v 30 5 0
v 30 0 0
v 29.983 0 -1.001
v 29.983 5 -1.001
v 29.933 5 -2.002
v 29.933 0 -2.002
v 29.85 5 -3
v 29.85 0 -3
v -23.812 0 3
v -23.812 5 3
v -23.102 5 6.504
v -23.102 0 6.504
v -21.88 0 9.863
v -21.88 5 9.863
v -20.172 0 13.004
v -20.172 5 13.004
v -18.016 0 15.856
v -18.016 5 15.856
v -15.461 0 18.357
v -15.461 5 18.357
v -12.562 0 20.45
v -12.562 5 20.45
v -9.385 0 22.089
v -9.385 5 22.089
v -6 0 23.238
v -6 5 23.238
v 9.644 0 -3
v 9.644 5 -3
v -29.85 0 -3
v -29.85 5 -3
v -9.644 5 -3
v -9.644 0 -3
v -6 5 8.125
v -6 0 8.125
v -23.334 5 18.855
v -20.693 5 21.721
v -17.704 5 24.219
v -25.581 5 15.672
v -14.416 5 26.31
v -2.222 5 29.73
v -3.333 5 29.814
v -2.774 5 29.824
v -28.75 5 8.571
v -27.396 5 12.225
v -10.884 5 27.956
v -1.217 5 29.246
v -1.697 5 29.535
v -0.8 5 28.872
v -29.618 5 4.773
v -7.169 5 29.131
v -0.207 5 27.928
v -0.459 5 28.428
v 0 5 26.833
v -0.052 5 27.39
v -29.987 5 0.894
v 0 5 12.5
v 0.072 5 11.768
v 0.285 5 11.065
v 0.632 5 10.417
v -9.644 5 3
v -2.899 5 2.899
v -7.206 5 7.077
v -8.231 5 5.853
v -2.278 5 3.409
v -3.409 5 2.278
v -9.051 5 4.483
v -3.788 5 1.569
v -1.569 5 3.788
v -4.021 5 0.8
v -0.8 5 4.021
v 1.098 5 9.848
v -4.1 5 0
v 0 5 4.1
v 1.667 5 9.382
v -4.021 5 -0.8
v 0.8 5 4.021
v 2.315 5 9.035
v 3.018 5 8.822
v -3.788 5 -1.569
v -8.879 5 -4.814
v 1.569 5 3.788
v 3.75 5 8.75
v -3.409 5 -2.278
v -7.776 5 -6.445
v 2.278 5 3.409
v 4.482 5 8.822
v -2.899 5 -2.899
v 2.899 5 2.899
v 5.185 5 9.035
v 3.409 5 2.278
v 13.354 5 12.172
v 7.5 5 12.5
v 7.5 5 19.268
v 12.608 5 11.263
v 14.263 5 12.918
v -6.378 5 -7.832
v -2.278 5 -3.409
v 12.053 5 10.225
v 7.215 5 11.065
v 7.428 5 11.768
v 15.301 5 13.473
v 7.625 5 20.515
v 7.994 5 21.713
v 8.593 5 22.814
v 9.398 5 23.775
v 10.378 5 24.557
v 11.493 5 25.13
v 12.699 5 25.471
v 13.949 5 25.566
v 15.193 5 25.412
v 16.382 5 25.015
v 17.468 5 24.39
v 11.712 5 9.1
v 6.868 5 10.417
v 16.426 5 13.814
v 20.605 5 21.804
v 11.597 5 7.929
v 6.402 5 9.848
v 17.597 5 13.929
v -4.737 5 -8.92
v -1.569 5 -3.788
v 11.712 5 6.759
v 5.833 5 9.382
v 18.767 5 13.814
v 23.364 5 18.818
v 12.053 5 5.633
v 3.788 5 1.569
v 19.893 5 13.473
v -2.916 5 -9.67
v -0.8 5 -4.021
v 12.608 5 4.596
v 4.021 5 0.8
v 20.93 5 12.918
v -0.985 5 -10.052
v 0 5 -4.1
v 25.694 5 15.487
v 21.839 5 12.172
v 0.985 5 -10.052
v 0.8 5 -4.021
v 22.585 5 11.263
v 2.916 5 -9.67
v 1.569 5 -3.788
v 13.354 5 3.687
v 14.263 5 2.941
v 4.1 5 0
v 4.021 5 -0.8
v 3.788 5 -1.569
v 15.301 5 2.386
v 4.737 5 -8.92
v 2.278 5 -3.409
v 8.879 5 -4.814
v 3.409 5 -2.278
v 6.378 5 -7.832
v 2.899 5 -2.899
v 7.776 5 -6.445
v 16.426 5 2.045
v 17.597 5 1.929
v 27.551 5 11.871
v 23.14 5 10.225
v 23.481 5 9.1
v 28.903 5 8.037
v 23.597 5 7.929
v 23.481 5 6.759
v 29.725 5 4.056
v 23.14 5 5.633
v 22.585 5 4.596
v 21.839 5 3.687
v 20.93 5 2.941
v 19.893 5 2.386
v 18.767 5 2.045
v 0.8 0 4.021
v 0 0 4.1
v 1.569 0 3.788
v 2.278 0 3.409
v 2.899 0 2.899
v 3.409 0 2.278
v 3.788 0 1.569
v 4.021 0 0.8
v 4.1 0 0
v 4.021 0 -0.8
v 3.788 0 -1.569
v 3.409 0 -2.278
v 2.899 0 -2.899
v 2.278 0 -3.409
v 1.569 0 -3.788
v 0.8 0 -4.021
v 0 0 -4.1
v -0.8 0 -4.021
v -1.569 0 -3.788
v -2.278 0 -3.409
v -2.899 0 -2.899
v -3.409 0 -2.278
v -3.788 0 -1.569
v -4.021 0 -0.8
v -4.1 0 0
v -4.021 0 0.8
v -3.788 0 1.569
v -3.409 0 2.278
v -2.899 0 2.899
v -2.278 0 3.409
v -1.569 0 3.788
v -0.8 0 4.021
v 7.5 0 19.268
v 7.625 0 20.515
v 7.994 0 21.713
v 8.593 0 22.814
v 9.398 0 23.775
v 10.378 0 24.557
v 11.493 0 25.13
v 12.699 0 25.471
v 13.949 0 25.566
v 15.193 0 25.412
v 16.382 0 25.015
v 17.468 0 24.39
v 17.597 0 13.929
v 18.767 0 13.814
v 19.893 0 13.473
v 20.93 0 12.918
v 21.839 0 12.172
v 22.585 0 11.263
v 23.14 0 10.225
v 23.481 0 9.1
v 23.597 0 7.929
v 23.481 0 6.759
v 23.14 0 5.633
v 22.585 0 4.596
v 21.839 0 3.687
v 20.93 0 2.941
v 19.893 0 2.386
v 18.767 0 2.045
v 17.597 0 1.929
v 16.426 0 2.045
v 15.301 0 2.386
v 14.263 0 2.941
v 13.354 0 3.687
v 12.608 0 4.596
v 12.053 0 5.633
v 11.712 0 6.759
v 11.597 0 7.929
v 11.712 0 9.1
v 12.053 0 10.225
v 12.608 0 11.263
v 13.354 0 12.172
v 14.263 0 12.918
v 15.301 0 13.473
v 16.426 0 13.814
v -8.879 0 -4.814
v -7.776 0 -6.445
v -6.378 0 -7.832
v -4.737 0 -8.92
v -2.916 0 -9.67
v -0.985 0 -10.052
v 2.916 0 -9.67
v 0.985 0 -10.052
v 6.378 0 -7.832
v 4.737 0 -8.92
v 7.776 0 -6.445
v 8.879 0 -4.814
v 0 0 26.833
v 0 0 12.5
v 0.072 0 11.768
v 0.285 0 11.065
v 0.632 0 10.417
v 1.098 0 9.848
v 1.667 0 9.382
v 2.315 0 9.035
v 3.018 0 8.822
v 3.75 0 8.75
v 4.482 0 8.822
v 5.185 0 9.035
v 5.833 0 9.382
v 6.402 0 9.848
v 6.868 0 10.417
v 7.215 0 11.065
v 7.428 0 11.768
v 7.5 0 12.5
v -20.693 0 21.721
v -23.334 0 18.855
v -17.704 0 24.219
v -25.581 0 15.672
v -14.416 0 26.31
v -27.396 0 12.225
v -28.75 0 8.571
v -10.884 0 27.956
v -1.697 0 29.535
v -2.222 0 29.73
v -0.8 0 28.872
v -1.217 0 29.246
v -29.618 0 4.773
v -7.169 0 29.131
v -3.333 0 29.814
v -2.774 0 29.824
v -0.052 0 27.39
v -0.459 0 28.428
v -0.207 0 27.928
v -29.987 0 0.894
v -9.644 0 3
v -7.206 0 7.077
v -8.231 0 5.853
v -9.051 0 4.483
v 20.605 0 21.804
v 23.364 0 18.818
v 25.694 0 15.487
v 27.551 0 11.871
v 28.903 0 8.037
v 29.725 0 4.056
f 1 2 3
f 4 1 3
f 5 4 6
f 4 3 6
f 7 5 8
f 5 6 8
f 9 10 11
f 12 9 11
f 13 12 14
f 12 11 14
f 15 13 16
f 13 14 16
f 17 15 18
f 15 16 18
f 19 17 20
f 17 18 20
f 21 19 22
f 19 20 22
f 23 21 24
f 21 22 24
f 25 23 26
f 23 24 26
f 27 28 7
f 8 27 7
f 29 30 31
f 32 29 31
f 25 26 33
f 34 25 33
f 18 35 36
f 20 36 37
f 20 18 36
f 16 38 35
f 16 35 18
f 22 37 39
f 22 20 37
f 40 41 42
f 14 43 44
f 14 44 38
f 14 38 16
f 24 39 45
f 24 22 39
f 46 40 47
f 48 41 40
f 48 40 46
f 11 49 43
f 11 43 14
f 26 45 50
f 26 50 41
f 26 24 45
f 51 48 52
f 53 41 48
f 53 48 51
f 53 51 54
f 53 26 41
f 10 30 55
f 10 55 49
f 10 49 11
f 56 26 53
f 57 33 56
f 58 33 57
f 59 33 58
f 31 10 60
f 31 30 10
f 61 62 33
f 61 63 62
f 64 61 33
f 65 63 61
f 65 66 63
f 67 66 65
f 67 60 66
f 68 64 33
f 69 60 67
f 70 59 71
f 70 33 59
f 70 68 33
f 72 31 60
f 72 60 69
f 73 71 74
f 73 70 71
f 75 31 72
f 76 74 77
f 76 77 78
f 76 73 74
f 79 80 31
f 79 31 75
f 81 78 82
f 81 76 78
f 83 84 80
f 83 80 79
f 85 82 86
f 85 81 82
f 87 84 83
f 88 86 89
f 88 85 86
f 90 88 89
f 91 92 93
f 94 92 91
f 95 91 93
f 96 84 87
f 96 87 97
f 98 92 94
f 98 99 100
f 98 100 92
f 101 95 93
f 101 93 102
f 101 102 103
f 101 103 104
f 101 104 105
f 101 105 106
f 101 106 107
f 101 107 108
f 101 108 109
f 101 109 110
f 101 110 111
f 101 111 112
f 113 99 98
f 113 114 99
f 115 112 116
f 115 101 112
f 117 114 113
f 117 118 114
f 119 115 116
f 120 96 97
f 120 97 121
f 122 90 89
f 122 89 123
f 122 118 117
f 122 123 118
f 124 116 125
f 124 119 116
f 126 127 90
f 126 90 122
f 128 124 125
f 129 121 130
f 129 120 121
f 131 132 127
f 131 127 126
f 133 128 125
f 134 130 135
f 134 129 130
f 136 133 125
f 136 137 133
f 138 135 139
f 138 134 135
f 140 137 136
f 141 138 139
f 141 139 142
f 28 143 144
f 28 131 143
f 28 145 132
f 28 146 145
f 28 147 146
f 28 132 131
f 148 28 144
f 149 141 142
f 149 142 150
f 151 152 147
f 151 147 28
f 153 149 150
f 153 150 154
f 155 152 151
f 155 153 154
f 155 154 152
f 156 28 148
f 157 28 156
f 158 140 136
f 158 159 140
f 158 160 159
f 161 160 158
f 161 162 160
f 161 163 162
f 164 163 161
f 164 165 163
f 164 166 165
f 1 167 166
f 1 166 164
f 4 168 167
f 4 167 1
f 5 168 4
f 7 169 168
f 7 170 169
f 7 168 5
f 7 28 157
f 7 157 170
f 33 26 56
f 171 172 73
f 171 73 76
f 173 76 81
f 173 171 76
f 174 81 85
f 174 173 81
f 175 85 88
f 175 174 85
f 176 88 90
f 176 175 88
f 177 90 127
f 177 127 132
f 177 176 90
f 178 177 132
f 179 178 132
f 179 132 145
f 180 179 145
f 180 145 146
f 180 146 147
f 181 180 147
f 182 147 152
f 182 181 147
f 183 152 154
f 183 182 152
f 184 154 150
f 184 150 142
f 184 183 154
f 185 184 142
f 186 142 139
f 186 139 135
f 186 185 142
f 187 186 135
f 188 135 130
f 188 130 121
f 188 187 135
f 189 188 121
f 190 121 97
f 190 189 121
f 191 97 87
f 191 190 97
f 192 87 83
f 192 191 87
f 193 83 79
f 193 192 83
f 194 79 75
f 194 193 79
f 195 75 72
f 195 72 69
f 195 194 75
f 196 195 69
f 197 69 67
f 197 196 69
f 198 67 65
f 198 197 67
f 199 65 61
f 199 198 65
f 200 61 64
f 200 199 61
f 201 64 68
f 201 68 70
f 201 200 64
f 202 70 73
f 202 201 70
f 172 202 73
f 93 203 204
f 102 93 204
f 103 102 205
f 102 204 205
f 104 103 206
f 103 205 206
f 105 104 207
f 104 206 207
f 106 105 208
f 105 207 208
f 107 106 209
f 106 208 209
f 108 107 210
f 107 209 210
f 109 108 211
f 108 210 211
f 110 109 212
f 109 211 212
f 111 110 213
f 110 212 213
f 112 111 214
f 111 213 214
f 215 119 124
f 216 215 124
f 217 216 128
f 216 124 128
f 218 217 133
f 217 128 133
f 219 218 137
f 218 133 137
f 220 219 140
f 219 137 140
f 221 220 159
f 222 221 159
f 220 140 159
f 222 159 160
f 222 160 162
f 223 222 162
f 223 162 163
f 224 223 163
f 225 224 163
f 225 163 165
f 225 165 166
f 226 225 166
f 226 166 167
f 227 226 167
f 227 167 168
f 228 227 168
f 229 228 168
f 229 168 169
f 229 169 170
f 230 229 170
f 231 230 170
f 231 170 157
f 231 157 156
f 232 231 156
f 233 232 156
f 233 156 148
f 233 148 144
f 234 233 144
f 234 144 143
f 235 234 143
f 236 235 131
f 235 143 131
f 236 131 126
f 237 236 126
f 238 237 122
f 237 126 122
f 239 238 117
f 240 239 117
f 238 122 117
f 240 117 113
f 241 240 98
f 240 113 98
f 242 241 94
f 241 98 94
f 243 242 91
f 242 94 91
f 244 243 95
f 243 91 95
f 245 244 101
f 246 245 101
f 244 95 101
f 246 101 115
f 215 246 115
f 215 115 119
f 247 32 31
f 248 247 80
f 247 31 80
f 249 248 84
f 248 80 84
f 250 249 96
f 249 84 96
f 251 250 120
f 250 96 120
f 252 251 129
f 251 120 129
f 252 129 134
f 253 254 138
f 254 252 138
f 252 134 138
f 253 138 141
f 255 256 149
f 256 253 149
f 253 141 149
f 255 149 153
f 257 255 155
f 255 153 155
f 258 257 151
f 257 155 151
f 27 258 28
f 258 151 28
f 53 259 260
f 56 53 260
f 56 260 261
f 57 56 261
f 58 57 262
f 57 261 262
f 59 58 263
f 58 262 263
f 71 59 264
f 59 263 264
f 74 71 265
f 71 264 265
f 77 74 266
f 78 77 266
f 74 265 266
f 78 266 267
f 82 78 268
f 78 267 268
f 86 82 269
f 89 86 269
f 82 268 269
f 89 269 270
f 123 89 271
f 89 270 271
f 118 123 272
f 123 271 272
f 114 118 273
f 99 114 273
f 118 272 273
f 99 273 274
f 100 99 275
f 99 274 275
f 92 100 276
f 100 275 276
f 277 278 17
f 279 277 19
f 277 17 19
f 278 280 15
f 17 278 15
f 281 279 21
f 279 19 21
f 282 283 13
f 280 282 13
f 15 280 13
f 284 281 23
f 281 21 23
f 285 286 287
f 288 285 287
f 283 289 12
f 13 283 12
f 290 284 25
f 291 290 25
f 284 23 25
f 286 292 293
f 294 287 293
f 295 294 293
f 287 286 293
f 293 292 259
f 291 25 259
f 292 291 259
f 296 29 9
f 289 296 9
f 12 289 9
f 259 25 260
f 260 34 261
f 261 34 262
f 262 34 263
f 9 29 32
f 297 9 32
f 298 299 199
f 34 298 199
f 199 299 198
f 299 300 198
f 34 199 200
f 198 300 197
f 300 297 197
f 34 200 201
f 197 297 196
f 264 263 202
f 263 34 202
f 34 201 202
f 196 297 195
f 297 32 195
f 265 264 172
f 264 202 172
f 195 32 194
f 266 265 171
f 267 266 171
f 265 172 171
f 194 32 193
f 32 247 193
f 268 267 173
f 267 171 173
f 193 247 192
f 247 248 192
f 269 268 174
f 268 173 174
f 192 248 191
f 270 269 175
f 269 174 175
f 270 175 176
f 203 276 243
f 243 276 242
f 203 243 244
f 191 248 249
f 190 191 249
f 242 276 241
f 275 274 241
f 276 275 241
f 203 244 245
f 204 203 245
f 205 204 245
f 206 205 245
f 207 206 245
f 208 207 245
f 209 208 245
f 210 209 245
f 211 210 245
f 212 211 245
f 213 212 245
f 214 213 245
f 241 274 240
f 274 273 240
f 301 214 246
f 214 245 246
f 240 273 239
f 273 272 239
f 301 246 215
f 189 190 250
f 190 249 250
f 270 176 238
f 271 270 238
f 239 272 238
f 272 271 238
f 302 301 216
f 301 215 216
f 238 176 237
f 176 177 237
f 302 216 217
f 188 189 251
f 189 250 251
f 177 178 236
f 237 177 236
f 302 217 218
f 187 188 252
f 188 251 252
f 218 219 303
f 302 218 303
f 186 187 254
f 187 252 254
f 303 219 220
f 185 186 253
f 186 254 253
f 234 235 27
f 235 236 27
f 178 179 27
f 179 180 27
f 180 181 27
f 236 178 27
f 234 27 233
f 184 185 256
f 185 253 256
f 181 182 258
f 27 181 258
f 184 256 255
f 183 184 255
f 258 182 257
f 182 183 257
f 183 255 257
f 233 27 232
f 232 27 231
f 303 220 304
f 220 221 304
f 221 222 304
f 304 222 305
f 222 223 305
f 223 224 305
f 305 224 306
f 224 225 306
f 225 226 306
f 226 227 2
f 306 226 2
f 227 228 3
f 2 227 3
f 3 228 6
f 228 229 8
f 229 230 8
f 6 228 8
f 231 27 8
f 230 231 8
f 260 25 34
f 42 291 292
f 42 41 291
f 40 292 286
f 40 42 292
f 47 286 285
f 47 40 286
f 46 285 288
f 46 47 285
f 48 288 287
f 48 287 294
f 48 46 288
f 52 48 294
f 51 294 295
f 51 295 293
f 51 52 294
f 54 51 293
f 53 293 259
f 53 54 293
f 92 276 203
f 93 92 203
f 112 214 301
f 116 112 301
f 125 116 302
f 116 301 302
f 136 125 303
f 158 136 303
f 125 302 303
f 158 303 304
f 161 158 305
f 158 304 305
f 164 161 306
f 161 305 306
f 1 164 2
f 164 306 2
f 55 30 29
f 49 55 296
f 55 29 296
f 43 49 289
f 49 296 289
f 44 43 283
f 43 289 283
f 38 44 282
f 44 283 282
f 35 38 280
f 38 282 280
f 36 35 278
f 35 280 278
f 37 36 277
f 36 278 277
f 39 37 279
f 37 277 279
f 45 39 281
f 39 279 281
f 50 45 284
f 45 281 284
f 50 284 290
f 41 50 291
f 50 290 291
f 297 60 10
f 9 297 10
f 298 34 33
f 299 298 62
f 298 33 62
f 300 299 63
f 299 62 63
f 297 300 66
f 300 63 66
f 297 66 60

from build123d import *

# Parameters (mm, degrees)
SKETCH1_R           = 4.1
SKETCH1_R_2         = 6.3
BOSS_EXTRUDE1_DEPTH = 5
FILLET1_R           = 3
CUT_EXTRUDE1_DEPTH  = 43.720018727
SKETCH3_R           = 6
CUT_EXTRUDE2_DEPTH  = 43.60278036


with BuildPart() as part:
    # Sketch1 → Boss-Extrude1 (new body)
    # profile 1 of 2: a face of its own
    with BuildSketch(Plane(origin=(0, 0, 0), x_dir=(1, 0, 0), z_dir=(0, 1, 0))):
        with BuildLine():
            Line((0, -30), (0, -12.5))
            ThreePointArc((0, -12.5), (3.75, -8.75), (7.5, -12.5))
            Line((7.5, -12.5), (7.5, -19.267848855))
            ThreePointArc((7.5, -19.267848855), (13.800000007, -12.967848868), (20.1, -19.267848868))
            ThreePointArc((20.1, -19.267848868), (19.403598453, -22.147030066), (17.468354167, -24.3896823))
            ThreePointArc((17.468354167, -24.3896823), (26.683802437, -13.710386117), (30, 0))
            ThreePointArc((30, 0), (-21.213203436, 21.213203436), (0, -30))
        make_face()
        with Locations(Location((0, 0, 0), (0, 0, 270))):
            Circle(SKETCH1_R, mode=Mode.SUBTRACT)
    # profile 2 of 2: a face of its own
    with BuildSketch(Plane(origin=(0, 0, 0), x_dir=(1, 0, 0), z_dir=(0, 1, 0))):
        with Locations((13.8, -19.267848868)):
            Circle(SKETCH1_R_2)
    extrude(amount=BOSS_EXTRUDE1_DEPTH)

    # Fillet1
    fillet1_edges = [part.edges().sort_by_distance(p)[0] for p in [
        (0, 2.5, 30),
    ]]
    fillet(fillet1_edges, radius=FILLET1_R)

    # Sketch2 → Cut-Extrude1 (cut, through all)
    with BuildSketch(Plane(origin=(0, 5, 0), x_dir=(1, 0, 0), z_dir=(0, 1, 0))):
        with BuildLine():
            Line((-24, 3), (-23.8117618, 3))
            ThreePointArc((-23.8117618, 3), (0, 24), (23.8117618, 3))
            Line((23.8117618, 3), (24, 3))
            Line((24, 3), (29.849623113, 3))
            ThreePointArc((29.849623113, 3), (0, 30), (-29.849623113, 3))
            Line((-29.849623113, 3), (-24, 3))
        make_face()
        with BuildLine():
            ThreePointArc((23.8117618, 3), (0, 24), (-23.8117618, 3))
            Line((-23.8117618, 3), (-9.644169223, 3))
            ThreePointArc((-9.644169223, 3), (0, 10.1), (9.644169223, 3))
            Line((9.644169223, 3), (23.8117618, 3))
        make_face()
        with BuildLine():
            ThreePointArc((-23.8117618, -3), (-18.016060482, -15.856278401), (-6, -23.237900077))
            Line((-6, -23.237900077), (-6, -8.124653839))
            ThreePointArc((-6, -8.124653839), (-8.231070824, -5.85315924), (-9.644169223, -3))
            Line((-9.644169223, -3), (-23.8117618, -3))
        make_face()
    extrude(amount=-CUT_EXTRUDE1_DEPTH, mode=Mode.SUBTRACT)

    # Sketch3 → Cut-Extrude2 (cut, through all)
    with BuildSketch(Plane(origin=(0, 5, 0), x_dir=(1, 0, 0), z_dir=(0, 1, 0))):
        with Locations(Location((17.596672685, -7.929343091, 0), (0, 0, 270))):
            Circle(SKETCH3_R)
    extrude(amount=-CUT_EXTRUDE2_DEPTH, mode=Mode.SUBTRACT)


solid = part.part
